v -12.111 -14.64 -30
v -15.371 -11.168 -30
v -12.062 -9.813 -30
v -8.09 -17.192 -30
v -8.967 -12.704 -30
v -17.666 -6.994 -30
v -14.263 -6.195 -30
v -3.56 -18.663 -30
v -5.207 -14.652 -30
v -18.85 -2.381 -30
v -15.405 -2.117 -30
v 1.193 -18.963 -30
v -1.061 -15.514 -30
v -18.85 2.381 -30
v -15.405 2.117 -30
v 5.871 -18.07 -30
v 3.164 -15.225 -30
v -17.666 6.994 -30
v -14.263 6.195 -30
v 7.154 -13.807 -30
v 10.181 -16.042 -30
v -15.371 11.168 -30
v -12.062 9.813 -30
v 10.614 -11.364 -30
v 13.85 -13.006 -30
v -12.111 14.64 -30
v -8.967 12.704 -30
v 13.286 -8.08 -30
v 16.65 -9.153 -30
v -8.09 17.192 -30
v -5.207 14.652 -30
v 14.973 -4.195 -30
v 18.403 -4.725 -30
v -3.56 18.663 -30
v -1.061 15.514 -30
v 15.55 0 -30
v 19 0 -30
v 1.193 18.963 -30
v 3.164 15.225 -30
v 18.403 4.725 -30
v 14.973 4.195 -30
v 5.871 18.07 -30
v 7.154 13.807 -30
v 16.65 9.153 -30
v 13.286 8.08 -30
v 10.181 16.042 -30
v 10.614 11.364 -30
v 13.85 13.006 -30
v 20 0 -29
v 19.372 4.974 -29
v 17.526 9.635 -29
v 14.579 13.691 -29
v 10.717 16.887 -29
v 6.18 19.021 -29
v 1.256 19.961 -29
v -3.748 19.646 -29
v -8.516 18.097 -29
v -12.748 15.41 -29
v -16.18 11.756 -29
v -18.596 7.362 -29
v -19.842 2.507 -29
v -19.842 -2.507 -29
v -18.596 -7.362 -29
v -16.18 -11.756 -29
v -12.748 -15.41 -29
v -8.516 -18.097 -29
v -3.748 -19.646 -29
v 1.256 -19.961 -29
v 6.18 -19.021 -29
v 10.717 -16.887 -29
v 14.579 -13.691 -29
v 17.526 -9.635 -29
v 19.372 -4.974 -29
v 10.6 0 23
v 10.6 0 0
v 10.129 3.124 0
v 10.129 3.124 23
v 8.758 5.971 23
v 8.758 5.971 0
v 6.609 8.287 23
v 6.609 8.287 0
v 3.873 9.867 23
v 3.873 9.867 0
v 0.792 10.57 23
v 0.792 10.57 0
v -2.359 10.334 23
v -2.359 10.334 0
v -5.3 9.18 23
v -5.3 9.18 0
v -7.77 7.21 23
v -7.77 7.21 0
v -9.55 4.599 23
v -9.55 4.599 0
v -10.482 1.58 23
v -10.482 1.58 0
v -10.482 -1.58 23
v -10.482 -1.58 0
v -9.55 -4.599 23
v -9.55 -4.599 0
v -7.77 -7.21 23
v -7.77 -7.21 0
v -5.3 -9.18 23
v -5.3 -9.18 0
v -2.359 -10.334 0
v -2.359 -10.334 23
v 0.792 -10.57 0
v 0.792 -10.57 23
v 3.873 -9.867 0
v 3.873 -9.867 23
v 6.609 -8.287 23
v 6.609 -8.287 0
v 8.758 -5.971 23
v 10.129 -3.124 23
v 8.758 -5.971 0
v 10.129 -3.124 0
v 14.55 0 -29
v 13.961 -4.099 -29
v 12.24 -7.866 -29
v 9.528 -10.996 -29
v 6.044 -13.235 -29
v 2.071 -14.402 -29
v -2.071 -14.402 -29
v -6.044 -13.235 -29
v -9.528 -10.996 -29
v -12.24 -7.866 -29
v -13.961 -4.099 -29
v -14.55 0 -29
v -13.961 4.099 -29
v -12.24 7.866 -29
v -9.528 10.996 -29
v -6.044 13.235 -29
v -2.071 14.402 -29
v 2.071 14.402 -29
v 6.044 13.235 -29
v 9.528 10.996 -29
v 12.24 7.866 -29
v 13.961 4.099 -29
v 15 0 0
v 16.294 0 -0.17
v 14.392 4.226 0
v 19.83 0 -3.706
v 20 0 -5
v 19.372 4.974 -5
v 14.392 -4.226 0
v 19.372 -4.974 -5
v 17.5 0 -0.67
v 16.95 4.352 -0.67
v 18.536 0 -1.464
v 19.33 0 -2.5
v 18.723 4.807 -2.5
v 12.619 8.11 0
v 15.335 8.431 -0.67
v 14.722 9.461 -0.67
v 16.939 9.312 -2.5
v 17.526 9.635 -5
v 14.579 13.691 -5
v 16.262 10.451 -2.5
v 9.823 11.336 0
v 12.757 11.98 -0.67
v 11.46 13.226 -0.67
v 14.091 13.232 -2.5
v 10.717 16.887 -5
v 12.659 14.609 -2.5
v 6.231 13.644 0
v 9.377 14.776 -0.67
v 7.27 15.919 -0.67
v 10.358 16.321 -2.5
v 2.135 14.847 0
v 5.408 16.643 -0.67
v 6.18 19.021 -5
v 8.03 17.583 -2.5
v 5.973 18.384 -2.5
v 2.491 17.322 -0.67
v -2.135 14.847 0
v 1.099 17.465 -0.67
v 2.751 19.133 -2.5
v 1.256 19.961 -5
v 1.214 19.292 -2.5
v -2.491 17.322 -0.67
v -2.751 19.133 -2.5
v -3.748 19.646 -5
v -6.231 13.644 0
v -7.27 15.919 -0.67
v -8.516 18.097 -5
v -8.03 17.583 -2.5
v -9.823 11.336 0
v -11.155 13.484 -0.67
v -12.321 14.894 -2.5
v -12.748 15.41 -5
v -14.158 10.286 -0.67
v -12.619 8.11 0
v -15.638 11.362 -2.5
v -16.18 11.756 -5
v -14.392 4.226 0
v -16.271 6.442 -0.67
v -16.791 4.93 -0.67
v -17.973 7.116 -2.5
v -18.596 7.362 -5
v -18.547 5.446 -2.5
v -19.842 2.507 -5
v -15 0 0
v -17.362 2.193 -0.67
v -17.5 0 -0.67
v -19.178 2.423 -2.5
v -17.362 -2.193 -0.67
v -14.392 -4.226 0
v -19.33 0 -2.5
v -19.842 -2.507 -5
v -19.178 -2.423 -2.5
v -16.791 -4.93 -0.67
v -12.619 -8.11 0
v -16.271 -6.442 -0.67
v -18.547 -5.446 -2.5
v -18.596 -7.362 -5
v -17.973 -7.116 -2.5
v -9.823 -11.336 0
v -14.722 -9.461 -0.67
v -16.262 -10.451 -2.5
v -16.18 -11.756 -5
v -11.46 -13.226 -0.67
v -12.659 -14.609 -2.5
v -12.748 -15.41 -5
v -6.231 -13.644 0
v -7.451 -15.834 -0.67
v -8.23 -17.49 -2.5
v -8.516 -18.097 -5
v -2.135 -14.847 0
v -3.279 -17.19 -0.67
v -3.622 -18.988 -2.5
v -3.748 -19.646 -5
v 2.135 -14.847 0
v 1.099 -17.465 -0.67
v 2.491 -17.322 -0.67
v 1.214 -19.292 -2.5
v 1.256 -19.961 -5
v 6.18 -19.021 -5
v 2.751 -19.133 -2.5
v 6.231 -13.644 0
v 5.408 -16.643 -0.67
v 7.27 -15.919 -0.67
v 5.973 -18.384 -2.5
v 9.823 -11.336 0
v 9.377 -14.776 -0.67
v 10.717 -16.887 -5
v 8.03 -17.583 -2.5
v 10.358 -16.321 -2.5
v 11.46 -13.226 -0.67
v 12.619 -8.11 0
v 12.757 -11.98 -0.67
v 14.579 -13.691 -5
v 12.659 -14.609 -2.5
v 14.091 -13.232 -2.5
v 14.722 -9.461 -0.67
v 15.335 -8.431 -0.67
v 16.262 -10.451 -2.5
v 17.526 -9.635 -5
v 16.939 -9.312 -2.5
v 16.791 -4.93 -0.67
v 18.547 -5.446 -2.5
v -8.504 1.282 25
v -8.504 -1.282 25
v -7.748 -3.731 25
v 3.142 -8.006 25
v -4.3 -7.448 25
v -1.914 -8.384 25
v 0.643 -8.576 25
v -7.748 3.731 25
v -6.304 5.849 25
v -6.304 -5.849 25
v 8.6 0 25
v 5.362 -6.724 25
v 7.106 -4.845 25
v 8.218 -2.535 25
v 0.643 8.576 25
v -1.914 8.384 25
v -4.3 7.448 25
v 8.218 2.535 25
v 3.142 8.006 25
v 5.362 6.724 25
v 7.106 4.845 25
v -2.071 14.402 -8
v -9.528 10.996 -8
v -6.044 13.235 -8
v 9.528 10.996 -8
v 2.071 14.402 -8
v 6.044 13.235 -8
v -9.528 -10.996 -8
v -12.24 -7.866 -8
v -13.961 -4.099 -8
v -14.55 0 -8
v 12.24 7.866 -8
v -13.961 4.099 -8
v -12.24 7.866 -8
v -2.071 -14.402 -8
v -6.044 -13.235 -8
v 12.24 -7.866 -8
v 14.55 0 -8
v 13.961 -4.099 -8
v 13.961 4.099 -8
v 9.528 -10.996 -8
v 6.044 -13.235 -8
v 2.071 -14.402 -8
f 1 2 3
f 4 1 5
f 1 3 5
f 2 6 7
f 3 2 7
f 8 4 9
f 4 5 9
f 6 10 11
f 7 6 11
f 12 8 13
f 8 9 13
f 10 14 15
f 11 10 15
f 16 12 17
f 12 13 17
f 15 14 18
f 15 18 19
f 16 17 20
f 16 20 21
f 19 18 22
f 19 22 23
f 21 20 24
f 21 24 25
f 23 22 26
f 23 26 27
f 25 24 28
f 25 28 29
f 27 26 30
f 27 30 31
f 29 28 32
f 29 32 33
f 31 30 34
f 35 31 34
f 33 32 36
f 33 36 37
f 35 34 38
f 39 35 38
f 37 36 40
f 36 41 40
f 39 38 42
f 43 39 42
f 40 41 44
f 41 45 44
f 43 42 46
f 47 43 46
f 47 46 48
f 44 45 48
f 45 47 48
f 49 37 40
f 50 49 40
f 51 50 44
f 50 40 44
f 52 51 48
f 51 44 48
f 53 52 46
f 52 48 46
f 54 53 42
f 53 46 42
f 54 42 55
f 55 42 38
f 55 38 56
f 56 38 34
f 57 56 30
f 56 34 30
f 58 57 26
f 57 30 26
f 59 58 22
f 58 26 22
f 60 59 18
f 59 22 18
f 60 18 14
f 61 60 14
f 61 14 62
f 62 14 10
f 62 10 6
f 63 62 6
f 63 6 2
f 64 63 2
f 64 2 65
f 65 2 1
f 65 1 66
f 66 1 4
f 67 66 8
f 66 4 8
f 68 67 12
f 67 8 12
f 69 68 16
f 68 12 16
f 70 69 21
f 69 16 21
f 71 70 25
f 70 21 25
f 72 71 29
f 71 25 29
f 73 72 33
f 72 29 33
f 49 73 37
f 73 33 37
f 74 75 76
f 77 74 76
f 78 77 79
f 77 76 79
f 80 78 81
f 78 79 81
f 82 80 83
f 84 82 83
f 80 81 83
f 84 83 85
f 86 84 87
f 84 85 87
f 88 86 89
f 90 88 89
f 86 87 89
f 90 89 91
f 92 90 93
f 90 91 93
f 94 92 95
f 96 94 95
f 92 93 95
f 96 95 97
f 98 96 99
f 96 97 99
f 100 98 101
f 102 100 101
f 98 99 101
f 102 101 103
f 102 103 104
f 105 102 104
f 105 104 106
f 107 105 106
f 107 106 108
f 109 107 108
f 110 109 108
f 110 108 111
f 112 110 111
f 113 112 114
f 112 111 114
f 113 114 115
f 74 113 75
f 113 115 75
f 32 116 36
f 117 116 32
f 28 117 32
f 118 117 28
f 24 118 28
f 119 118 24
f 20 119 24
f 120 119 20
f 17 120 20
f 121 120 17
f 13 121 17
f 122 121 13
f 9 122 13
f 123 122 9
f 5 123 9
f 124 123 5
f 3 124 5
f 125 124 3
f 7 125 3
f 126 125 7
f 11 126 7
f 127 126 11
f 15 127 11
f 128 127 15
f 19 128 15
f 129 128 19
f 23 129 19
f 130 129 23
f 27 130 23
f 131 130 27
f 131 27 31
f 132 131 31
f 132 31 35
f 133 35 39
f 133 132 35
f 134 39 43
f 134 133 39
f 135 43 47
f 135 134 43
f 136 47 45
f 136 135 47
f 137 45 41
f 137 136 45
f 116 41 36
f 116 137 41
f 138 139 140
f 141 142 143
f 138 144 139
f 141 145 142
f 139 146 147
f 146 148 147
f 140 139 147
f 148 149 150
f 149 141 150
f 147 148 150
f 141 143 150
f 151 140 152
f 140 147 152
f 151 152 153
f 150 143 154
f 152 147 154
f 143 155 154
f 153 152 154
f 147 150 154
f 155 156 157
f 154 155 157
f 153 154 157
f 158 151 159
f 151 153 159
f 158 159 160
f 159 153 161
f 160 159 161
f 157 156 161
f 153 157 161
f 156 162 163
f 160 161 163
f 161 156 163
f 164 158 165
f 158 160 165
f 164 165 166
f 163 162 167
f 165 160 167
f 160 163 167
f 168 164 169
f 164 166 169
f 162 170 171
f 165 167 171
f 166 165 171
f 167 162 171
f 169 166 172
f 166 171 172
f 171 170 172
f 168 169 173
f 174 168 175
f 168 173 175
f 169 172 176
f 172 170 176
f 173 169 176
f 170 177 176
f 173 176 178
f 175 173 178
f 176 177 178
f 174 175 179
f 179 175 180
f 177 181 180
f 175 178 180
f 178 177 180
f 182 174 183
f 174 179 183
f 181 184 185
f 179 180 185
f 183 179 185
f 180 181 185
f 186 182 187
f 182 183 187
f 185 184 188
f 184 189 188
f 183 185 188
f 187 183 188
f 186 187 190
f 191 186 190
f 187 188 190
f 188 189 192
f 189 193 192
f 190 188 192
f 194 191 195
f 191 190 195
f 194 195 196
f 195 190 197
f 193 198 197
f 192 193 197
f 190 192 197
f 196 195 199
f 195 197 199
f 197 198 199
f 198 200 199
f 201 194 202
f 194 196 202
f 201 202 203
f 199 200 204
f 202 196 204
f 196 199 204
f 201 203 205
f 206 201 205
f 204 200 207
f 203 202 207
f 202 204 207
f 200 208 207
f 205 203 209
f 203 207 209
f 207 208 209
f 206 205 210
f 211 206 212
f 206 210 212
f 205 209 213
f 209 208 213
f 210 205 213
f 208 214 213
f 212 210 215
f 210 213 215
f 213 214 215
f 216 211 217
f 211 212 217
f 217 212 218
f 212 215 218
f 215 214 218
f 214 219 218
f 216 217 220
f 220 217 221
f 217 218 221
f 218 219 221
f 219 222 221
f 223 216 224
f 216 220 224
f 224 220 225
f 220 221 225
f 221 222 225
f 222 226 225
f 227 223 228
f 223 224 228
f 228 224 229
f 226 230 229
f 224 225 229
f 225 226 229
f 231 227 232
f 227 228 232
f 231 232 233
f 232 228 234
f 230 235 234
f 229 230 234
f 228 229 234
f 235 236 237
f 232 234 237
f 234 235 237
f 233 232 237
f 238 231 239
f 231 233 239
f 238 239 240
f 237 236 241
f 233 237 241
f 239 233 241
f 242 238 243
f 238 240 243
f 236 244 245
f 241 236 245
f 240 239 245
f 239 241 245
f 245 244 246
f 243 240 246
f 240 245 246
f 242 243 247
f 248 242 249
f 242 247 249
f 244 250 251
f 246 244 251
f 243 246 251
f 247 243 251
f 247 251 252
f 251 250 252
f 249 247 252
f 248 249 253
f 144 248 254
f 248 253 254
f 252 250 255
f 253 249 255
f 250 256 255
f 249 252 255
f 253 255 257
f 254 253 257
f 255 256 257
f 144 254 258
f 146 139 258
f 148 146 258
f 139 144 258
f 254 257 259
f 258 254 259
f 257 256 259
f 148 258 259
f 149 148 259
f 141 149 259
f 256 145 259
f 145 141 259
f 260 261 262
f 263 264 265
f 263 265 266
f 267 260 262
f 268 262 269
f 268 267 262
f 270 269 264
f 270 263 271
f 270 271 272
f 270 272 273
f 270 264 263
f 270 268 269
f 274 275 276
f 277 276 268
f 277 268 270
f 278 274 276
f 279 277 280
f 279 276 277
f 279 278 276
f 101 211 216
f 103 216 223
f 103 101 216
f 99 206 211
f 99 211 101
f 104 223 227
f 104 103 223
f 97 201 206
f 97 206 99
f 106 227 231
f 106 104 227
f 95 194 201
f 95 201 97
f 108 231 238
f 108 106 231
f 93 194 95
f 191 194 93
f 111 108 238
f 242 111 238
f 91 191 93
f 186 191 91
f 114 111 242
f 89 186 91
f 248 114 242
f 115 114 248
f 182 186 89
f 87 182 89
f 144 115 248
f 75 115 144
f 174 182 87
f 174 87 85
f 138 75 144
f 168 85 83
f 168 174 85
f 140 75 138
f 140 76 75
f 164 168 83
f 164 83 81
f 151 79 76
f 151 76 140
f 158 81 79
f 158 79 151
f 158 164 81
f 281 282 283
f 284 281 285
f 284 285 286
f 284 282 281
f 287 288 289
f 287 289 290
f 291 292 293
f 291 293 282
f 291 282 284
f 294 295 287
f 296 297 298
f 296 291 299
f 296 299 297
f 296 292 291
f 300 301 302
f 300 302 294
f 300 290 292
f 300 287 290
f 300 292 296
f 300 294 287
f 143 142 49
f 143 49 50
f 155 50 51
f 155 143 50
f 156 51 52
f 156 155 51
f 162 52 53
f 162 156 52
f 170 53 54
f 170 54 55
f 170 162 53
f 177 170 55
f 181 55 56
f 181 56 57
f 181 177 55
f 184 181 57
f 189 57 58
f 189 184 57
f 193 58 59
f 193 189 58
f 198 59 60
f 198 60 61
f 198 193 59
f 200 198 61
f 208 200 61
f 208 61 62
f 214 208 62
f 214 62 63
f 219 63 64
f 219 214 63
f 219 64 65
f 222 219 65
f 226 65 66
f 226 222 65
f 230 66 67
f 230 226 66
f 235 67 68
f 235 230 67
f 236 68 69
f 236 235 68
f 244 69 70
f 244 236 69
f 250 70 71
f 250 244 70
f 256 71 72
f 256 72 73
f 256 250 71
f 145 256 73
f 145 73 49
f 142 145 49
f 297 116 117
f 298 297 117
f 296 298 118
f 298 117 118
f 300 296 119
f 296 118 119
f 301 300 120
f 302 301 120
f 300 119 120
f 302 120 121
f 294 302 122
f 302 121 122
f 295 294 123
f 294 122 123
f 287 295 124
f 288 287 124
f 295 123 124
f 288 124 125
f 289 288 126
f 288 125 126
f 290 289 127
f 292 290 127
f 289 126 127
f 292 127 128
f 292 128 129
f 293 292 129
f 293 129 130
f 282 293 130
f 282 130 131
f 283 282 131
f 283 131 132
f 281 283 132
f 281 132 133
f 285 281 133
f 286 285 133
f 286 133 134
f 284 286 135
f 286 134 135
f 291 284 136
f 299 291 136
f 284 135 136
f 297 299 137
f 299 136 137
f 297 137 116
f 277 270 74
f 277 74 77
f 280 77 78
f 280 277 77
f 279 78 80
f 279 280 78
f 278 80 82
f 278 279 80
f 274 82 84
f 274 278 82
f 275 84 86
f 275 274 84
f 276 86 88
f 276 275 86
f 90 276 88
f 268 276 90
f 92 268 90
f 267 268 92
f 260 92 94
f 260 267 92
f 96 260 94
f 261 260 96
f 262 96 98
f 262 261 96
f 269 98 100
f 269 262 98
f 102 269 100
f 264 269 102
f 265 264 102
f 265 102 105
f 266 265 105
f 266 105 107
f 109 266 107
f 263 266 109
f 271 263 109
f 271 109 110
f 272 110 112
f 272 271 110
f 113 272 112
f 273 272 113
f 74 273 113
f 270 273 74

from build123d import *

# Parameters (mm, degrees)
F0_R     = 20
F1_DEPTH = 30
F2_R     = 10.6
F3_DEPTH = 25
F5_R     = 14.55
F6_DEPTH = 22
F7_SIZE  = 2
F8_R     = 5
F9_SIZE  = 1


with BuildPart() as f1:
    # F0 (on Top) → F1 (new body)
    with BuildSketch(Plane.XY):
        Circle(F0_R)
    extrude(amount=-F1_DEPTH)

    # F2 (on Top) → F3 (join)
    with BuildSketch(Plane.XY):
        Circle(F2_R)
    extrude(amount=F3_DEPTH)

    # F5 (on offset) → F6 (cut)
    with BuildSketch(Plane(origin=(0, 0, -30), x_dir=(1, 0, 0), z_dir=(0, 0, -1))):
        Circle(F5_R)
    extrude(amount=-F6_DEPTH, mode=Mode.SUBTRACT)

    # F7
    f7_edges = [f1.edges().sort_by_distance(p)[0] for p in [
        (-10.6, 0, 25),
    ]]
    chamfer(f7_edges, length=F7_SIZE)

    # F8
    f8_edges = [f1.edges().sort_by_distance(p)[0] for p in [
        (-20, 0, 0),
    ]]
    fillet(f8_edges, radius=F8_R)

    # F9
    f9_edges = [f1.edges().sort_by_distance(p)[0] for p in [
        (-20, 0, -30),
        (-14.55, 0, -30),
    ]]
    chamfer(f9_edges, length=F9_SIZE)


solid = f1.part
